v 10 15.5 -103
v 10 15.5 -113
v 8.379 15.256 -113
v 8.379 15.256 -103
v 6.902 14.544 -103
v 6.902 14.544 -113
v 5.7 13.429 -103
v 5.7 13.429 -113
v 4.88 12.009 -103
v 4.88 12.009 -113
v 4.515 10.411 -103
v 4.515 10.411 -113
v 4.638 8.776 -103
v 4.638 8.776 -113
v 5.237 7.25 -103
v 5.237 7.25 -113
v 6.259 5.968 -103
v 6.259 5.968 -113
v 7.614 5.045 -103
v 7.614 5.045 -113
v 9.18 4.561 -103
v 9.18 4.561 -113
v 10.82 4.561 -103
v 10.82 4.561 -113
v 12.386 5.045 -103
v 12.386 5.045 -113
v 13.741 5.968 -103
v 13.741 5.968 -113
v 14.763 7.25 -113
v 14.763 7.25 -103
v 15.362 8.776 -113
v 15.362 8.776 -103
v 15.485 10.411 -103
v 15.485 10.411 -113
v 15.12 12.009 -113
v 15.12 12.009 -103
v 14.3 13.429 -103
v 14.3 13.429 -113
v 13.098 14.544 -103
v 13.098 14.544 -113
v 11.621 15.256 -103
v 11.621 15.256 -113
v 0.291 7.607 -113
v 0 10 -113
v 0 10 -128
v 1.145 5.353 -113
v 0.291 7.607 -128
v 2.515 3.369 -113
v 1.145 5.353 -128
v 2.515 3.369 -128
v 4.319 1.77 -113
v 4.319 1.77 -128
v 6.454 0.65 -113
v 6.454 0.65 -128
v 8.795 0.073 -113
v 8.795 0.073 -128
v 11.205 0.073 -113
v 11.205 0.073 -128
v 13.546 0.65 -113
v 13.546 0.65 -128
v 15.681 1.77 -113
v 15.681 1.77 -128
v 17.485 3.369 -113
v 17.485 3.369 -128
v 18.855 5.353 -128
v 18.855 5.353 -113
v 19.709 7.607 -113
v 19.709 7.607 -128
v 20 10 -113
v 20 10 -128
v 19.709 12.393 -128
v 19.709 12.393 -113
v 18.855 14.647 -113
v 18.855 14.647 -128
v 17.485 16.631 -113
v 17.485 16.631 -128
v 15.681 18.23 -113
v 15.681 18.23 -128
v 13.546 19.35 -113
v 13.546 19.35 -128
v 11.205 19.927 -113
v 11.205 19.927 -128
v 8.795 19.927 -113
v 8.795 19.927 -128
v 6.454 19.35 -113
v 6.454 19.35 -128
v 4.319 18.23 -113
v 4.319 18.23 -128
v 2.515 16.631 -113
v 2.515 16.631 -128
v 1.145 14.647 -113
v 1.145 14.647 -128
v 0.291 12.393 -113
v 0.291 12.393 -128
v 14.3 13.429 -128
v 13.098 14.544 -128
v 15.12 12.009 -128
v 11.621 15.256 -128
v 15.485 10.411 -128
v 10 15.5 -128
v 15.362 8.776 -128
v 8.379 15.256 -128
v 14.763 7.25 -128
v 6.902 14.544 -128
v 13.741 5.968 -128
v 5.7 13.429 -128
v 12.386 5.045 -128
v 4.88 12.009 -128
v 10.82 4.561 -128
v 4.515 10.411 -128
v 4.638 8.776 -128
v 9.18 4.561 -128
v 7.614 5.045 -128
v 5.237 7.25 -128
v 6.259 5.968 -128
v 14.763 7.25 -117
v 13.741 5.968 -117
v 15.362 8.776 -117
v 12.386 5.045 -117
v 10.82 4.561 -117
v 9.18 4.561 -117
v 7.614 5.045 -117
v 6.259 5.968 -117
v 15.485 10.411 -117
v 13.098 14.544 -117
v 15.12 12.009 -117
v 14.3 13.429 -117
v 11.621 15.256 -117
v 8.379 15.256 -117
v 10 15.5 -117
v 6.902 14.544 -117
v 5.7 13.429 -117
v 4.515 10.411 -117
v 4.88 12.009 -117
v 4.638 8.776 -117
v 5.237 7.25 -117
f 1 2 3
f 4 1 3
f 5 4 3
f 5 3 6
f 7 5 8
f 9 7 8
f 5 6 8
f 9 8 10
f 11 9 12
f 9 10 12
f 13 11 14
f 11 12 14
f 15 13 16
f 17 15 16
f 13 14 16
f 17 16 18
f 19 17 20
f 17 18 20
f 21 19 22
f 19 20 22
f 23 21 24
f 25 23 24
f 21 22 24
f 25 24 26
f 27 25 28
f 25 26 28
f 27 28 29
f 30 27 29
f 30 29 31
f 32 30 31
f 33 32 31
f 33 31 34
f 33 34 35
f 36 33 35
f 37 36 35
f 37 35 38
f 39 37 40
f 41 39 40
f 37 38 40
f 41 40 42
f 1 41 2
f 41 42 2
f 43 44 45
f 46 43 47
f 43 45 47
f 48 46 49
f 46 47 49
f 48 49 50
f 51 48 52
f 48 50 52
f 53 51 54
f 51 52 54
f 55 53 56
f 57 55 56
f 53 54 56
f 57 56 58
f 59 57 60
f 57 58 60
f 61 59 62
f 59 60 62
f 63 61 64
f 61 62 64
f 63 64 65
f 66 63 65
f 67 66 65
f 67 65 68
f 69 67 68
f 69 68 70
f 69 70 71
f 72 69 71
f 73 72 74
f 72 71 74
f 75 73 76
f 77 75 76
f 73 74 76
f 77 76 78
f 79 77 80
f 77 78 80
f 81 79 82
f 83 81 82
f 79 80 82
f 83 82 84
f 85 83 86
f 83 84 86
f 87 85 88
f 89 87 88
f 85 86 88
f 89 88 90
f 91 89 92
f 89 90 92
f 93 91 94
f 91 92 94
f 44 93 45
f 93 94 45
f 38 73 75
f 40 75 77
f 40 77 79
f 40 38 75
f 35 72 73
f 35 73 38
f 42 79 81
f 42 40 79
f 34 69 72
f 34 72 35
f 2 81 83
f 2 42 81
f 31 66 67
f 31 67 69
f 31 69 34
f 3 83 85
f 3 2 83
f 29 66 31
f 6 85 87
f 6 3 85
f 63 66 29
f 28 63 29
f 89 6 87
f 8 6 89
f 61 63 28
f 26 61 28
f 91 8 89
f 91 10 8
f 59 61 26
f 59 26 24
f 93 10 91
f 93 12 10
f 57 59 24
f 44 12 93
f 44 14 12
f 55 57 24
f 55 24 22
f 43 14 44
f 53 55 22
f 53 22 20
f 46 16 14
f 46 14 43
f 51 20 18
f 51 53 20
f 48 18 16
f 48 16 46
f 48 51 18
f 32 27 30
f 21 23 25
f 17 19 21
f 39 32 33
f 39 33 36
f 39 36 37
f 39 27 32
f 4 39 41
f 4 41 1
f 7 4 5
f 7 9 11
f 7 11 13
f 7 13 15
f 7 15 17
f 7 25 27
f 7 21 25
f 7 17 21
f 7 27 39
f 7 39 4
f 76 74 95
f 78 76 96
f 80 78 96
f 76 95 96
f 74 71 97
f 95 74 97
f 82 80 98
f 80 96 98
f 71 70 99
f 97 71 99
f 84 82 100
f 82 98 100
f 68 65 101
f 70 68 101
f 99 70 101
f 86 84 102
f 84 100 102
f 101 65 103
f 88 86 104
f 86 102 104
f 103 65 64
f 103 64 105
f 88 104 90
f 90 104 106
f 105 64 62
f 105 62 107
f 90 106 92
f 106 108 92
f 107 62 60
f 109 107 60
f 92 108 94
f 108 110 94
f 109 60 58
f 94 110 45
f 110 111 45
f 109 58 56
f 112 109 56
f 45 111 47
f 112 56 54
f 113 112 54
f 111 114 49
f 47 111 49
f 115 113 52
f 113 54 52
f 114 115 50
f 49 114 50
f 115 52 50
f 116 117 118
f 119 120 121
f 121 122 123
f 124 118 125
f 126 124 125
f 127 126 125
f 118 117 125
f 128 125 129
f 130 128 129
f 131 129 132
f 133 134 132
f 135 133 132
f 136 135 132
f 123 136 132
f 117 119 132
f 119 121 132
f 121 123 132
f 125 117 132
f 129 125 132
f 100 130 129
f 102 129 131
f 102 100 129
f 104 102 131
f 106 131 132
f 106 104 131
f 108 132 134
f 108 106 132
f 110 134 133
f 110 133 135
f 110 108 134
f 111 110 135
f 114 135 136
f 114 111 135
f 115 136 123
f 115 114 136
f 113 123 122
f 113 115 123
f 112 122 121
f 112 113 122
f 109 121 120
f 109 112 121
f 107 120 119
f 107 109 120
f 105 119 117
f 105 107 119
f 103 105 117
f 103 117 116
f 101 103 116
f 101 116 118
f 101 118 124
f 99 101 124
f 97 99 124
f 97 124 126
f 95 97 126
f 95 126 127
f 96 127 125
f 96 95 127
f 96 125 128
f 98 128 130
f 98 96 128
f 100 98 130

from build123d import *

# Parameters (mm, degrees)
CYLINDER003_R           = 10
CYLINDER003_DEPTH       = 15
CYLINDER004_R           = 5.5
CYLINDER004_DEPTH       = 10
CYLINDER005_R           = 5.5
CYLINDER005_DEPTH       = 11
BODY006_PLACEMENT_ANGLE = 90


with BuildPart() as part:
    # Cylinder003 → Cylinder003 (join)
    with BuildSketch(Plane(origin=(10, 0, -127), x_dir=(0, 1, 0), z_dir=(0, 0, 1))):
        Circle(CYLINDER003_R)
    extrude(amount=CYLINDER003_DEPTH)

    # Cylinder004 → Cylinder004 (join)
    with BuildSketch(Plane(origin=(10, 0, -112), x_dir=(1, 0, 0), z_dir=(0, 0, 1))):
        Circle(CYLINDER004_R)
    extrude(amount=CYLINDER004_DEPTH)

    # Cylinder005 → Cylinder005 (cut)
    with BuildSketch(Plane(origin=(10, 0, -127), x_dir=(1, 0, 0), z_dir=(0, 0, 1))):
        Circle(CYLINDER005_R)
    extrude(amount=CYLINDER005_DEPTH, mode=Mode.SUBTRACT)


with BuildPart() as part_1:
    # Body006 placement: moved
    add(part.part.moved(Location((10, 0, -1))).rotate(Axis((10, 0, -1), (0, 0, 1)), BODY006_PLACEMENT_ANGLE))


solid = part_1.part
